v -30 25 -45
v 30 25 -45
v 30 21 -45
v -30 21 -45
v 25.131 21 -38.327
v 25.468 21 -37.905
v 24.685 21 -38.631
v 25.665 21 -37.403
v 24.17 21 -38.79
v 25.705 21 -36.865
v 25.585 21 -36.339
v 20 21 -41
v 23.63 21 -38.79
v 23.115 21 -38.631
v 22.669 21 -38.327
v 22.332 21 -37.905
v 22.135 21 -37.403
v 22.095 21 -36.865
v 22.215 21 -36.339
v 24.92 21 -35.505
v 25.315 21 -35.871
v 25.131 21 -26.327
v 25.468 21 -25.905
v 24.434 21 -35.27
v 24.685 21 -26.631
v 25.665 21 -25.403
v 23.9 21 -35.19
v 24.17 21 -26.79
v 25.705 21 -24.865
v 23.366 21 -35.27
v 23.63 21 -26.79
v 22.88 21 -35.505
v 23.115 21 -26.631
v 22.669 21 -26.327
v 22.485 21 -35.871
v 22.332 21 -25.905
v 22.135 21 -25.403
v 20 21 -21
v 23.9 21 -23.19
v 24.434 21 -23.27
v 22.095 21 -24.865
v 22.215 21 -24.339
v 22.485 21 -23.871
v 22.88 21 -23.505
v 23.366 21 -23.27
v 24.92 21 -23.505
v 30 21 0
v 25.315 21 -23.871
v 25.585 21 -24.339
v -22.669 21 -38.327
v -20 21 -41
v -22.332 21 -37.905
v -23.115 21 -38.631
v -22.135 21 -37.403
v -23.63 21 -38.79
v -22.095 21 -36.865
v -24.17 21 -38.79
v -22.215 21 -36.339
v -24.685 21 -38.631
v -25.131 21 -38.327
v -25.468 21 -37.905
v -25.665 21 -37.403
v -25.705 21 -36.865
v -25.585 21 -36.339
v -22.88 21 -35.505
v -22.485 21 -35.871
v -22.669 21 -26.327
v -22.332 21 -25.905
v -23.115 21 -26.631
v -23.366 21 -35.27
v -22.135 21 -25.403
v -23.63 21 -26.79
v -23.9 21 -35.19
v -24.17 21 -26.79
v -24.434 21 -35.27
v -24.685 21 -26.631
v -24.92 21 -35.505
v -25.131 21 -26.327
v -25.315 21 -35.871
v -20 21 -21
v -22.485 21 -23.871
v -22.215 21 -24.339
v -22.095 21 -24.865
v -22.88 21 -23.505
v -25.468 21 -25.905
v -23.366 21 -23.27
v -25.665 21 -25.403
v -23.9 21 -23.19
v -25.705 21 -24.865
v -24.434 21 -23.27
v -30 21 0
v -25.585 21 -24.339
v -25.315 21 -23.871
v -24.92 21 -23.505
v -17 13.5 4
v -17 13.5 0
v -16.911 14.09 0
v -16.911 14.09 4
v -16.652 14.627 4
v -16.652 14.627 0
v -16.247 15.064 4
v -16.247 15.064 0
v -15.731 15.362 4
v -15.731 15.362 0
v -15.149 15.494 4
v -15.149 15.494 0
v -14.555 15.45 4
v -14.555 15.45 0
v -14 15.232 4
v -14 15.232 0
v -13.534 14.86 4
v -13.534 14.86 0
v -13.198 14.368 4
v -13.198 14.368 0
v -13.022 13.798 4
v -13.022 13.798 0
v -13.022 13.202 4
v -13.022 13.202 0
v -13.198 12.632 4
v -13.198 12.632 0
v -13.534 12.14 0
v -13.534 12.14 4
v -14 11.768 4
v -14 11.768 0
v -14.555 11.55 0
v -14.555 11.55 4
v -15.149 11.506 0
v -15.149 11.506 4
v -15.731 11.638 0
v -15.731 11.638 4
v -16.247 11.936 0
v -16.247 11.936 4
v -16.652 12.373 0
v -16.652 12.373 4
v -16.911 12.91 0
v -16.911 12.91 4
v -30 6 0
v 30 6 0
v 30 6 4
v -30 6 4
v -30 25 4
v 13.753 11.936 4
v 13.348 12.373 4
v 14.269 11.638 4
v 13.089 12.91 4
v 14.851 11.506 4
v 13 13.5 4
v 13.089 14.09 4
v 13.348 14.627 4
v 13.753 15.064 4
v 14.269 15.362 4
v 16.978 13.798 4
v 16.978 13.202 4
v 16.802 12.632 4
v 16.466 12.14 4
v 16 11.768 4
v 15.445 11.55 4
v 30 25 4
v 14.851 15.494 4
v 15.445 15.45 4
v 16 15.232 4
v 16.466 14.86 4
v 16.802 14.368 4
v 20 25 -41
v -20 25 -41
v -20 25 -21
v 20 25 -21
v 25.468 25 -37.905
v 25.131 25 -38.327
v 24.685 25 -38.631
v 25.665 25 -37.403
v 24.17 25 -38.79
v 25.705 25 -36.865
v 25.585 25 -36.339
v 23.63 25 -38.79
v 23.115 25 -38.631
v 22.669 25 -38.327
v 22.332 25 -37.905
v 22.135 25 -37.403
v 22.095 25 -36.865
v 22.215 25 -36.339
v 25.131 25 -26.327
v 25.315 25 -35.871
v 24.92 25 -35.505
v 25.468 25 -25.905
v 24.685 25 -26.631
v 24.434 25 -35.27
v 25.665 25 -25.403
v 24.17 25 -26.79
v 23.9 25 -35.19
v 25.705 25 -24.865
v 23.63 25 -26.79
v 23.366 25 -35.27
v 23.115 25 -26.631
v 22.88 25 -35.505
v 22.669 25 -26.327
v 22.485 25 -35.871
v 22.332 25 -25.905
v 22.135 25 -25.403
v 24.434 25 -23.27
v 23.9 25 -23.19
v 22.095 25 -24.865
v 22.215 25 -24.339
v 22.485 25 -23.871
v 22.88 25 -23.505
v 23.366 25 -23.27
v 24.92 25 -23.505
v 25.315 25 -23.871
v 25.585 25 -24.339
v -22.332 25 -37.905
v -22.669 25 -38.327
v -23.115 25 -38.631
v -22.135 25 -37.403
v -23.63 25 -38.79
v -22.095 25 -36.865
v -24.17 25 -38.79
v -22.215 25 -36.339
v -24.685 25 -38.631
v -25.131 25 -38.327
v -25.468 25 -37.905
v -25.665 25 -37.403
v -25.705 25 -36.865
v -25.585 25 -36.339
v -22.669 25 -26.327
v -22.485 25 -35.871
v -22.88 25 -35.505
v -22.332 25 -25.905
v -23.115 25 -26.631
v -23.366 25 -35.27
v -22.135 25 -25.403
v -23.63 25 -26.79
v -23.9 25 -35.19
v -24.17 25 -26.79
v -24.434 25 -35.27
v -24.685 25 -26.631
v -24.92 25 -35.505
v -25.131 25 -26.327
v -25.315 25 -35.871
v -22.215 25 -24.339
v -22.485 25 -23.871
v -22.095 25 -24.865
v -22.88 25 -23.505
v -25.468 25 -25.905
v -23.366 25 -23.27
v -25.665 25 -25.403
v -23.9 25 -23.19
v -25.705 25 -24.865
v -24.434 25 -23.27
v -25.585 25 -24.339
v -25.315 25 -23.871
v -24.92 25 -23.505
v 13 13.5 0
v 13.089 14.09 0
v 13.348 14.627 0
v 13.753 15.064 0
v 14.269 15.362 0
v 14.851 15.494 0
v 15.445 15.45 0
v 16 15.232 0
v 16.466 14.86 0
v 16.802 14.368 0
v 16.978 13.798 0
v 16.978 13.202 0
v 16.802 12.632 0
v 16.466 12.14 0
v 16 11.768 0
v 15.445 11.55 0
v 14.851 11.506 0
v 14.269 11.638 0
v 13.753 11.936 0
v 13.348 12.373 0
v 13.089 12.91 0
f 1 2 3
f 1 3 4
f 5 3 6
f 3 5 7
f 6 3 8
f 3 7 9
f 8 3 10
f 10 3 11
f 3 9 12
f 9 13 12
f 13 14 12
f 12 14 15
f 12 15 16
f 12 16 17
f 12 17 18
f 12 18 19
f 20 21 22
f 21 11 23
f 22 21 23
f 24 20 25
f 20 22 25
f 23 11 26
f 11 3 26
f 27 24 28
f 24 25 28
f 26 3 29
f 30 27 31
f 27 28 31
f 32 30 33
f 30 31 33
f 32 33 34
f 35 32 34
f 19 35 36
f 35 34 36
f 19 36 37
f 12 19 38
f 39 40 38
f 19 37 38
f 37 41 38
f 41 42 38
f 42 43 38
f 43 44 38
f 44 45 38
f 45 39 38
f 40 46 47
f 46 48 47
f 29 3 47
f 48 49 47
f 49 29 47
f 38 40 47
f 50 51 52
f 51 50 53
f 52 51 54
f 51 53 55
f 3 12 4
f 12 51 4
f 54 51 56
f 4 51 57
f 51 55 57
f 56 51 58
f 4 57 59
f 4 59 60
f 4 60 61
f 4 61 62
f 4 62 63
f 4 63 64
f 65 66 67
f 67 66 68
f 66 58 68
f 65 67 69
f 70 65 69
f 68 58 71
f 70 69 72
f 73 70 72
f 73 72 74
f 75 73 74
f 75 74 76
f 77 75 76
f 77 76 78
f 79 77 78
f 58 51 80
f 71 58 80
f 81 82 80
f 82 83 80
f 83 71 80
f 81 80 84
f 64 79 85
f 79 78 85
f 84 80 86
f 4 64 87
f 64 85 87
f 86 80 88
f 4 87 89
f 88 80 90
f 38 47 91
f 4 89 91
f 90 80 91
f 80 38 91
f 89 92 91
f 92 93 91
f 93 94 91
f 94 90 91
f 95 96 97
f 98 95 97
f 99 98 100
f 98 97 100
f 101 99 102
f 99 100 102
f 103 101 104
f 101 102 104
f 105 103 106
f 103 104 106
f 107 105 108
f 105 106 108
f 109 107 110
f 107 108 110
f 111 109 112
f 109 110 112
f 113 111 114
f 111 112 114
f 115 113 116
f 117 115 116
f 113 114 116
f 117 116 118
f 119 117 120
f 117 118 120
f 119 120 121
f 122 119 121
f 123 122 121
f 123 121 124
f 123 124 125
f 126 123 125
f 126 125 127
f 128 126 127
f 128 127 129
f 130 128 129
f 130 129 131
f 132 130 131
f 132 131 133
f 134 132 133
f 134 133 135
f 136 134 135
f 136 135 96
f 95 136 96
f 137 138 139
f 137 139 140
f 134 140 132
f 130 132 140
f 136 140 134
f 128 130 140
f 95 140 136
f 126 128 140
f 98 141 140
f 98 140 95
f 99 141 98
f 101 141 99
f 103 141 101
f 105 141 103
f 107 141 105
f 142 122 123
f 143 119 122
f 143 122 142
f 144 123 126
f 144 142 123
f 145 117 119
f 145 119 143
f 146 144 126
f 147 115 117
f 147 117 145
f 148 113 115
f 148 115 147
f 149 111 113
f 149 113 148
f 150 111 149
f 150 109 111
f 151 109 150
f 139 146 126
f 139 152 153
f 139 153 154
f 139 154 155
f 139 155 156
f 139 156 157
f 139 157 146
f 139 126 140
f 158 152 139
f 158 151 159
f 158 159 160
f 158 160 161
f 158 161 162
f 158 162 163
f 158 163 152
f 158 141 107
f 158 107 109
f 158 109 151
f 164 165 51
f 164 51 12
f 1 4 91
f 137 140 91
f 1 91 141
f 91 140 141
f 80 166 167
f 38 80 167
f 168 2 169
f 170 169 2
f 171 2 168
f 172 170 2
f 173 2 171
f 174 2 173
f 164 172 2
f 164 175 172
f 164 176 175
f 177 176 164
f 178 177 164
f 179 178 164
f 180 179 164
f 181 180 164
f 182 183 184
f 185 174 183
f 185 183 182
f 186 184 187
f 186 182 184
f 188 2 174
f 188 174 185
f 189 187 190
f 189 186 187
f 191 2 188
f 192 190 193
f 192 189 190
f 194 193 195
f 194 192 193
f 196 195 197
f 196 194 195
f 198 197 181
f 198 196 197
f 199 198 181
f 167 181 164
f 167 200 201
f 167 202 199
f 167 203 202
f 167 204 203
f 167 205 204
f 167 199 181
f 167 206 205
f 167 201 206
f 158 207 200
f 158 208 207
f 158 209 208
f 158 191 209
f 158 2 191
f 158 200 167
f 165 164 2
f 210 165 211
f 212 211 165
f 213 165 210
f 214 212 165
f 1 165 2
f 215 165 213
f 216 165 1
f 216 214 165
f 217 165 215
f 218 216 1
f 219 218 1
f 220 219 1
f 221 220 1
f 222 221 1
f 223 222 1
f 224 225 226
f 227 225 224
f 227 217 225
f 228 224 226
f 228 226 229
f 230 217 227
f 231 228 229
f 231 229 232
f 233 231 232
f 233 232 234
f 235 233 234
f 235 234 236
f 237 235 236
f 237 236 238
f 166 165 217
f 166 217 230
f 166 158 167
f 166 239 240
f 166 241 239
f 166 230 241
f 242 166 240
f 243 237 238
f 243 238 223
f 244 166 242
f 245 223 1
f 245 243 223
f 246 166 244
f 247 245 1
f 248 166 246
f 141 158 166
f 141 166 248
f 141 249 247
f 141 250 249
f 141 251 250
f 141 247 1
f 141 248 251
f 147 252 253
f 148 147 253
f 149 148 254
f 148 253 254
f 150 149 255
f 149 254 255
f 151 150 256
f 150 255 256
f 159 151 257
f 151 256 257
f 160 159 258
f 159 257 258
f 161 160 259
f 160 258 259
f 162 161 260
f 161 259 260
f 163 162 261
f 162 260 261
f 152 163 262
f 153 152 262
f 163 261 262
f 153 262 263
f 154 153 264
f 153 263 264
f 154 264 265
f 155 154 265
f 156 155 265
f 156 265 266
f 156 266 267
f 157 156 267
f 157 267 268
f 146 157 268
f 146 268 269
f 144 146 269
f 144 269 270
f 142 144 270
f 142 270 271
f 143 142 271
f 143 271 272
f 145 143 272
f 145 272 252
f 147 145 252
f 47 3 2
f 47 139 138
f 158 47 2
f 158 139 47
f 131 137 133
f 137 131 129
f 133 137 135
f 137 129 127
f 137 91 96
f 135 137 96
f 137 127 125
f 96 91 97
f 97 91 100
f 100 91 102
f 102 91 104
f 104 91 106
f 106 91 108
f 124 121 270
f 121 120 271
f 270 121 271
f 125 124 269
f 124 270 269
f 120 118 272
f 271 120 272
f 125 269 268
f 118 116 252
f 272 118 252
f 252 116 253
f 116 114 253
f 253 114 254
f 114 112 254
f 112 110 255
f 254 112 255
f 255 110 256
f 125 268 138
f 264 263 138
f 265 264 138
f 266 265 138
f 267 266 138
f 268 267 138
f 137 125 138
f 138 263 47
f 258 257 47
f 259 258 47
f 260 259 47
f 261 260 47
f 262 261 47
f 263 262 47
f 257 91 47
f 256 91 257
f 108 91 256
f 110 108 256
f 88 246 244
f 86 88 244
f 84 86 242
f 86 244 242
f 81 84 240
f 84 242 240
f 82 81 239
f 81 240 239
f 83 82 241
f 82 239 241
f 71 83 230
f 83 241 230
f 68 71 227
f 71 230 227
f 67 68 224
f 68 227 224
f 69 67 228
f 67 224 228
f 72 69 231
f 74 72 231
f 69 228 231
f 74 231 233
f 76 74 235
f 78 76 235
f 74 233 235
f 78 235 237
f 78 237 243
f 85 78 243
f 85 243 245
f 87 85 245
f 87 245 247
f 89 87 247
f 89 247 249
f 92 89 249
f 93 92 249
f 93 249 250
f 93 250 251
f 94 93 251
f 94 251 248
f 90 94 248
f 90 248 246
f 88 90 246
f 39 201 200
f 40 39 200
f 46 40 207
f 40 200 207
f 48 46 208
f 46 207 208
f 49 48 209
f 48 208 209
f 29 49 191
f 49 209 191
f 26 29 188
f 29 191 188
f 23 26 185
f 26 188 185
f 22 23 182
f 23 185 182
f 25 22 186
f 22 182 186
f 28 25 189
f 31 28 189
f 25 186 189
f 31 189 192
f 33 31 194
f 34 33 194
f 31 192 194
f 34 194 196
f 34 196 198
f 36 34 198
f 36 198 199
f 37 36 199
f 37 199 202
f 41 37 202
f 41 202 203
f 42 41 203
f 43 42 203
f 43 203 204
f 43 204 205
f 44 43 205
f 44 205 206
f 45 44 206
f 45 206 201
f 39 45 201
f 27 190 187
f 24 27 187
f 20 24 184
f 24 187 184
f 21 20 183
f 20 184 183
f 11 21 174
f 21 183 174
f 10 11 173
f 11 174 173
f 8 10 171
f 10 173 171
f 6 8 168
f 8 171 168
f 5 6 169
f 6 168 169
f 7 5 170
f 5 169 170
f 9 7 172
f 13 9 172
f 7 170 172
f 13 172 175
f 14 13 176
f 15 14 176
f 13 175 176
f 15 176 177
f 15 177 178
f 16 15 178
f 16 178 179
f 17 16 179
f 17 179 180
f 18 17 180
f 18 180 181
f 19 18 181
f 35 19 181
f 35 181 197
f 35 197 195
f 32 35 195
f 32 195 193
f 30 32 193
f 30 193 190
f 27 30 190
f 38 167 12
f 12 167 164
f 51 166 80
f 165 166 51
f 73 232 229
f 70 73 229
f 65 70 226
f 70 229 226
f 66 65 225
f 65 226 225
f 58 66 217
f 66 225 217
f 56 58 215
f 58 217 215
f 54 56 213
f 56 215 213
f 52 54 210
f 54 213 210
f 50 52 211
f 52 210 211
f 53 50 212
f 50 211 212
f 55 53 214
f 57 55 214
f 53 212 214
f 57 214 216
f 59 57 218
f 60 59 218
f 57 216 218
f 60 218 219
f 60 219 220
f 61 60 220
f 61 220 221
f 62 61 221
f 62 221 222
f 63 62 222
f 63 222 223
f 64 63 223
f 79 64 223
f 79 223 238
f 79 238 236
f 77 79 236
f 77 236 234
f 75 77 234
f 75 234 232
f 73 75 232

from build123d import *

# Parameters (mm, degrees)
SKETCH1_W           = 60
SKETCH1_H           = 50
BOSS_EXTRUDE1_DEPTH = 4
SKETCH2_W           = 60
SKETCH2_H           = 4
BOSS_EXTRUDE2_DEPTH = 45
SKETCH3_W           = 40
SKETCH3_H           = 20
CUT_EXTRUDE1_DEPTH  = 60
SKETCH4_W           = 60
SKETCH4_H           = 31
CUT_EXTRUDE2_DEPTH  = 10
SKETCH5_R           = 2
CUT_EXTRUDE3_DEPTH  = 60.581876439
SKETCH6_R           = 1.81
CUT_EXTRUDE4_DEPTH  = 10
SKETCH7_R           = 1.81
CUT_EXTRUDE5_DEPTH  = 58.323642592


with BuildPart() as part:
    # Sketch1 → Boss-Extrude1 (new body)
    with BuildSketch(Plane.XY):
        Rectangle(SKETCH1_W, SKETCH1_H)
    extrude(amount=BOSS_EXTRUDE1_DEPTH)

    # Sketch2 → Boss-Extrude2 (add)
    with BuildSketch(Plane(origin=(0, 0, 0), x_dir=(-1, 0, 0), z_dir=(0, 0, -1))):
        with Locations((0, 23)):
            Rectangle(SKETCH2_W, SKETCH2_H)
    extrude(amount=BOSS_EXTRUDE2_DEPTH)

    # Sketch3 → Cut-Extrude1 (cut)
    with BuildSketch(Plane(origin=(0, 25, 0), x_dir=(1, 0, 0), z_dir=(0, 1, 0))):
        with Locations((0, 31)):
            Rectangle(SKETCH3_W, SKETCH3_H)
    extrude(amount=-CUT_EXTRUDE1_DEPTH, mode=Mode.SUBTRACT)

    # Sketch4 → Cut-Extrude2 (cut)
    with BuildSketch(Plane(origin=(0, 0, 0), x_dir=(-1, 0, 0), z_dir=(0, 0, -1))):
        with Locations((0, -9.5)):
            Rectangle(SKETCH4_W, SKETCH4_H)
    extrude(amount=-CUT_EXTRUDE2_DEPTH, mode=Mode.SUBTRACT)

    # Sketch5 → Cut-Extrude3 (cut, through all)
    with BuildSketch(Plane(origin=(0, 0, 0), x_dir=(-1, 0, 0), z_dir=(0, 0, -1))):
        with Locations((-15, 13.5)):
            Circle(SKETCH5_R)
        with Locations((15, 13.5)):
            Circle(SKETCH5_R)
    extrude(amount=-CUT_EXTRUDE3_DEPTH, mode=Mode.SUBTRACT)

    # Sketch6 → Cut-Extrude4 (cut)
    with BuildSketch(Plane(origin=(0, 25, 0), x_dir=(1, 0, 0), z_dir=(0, 1, 0))):
        with Locations(Location((23.9, 25, 0), (0, 0, 270))):
            Circle(SKETCH6_R)
        with Locations(Location((23.9, 37, 0), (0, 0, 270))):
            Circle(SKETCH6_R)
    extrude(amount=-CUT_EXTRUDE4_DEPTH, mode=Mode.SUBTRACT)

    # Sketch7 → Cut-Extrude5 (cut, through all)
    with BuildSketch(Plane(origin=(0, 25, 0), x_dir=(1, 0, 0), z_dir=(0, 1, 0))):
        with Locations(Location((-23.9, 37, 0), (0, 0, 270))):
            Circle(SKETCH7_R)
        with Locations(Location((-23.9, 25, 0), (0, 0, 270))):
            Circle(SKETCH7_R)
    extrude(amount=-CUT_EXTRUDE5_DEPTH, mode=Mode.SUBTRACT)


solid = part.part
